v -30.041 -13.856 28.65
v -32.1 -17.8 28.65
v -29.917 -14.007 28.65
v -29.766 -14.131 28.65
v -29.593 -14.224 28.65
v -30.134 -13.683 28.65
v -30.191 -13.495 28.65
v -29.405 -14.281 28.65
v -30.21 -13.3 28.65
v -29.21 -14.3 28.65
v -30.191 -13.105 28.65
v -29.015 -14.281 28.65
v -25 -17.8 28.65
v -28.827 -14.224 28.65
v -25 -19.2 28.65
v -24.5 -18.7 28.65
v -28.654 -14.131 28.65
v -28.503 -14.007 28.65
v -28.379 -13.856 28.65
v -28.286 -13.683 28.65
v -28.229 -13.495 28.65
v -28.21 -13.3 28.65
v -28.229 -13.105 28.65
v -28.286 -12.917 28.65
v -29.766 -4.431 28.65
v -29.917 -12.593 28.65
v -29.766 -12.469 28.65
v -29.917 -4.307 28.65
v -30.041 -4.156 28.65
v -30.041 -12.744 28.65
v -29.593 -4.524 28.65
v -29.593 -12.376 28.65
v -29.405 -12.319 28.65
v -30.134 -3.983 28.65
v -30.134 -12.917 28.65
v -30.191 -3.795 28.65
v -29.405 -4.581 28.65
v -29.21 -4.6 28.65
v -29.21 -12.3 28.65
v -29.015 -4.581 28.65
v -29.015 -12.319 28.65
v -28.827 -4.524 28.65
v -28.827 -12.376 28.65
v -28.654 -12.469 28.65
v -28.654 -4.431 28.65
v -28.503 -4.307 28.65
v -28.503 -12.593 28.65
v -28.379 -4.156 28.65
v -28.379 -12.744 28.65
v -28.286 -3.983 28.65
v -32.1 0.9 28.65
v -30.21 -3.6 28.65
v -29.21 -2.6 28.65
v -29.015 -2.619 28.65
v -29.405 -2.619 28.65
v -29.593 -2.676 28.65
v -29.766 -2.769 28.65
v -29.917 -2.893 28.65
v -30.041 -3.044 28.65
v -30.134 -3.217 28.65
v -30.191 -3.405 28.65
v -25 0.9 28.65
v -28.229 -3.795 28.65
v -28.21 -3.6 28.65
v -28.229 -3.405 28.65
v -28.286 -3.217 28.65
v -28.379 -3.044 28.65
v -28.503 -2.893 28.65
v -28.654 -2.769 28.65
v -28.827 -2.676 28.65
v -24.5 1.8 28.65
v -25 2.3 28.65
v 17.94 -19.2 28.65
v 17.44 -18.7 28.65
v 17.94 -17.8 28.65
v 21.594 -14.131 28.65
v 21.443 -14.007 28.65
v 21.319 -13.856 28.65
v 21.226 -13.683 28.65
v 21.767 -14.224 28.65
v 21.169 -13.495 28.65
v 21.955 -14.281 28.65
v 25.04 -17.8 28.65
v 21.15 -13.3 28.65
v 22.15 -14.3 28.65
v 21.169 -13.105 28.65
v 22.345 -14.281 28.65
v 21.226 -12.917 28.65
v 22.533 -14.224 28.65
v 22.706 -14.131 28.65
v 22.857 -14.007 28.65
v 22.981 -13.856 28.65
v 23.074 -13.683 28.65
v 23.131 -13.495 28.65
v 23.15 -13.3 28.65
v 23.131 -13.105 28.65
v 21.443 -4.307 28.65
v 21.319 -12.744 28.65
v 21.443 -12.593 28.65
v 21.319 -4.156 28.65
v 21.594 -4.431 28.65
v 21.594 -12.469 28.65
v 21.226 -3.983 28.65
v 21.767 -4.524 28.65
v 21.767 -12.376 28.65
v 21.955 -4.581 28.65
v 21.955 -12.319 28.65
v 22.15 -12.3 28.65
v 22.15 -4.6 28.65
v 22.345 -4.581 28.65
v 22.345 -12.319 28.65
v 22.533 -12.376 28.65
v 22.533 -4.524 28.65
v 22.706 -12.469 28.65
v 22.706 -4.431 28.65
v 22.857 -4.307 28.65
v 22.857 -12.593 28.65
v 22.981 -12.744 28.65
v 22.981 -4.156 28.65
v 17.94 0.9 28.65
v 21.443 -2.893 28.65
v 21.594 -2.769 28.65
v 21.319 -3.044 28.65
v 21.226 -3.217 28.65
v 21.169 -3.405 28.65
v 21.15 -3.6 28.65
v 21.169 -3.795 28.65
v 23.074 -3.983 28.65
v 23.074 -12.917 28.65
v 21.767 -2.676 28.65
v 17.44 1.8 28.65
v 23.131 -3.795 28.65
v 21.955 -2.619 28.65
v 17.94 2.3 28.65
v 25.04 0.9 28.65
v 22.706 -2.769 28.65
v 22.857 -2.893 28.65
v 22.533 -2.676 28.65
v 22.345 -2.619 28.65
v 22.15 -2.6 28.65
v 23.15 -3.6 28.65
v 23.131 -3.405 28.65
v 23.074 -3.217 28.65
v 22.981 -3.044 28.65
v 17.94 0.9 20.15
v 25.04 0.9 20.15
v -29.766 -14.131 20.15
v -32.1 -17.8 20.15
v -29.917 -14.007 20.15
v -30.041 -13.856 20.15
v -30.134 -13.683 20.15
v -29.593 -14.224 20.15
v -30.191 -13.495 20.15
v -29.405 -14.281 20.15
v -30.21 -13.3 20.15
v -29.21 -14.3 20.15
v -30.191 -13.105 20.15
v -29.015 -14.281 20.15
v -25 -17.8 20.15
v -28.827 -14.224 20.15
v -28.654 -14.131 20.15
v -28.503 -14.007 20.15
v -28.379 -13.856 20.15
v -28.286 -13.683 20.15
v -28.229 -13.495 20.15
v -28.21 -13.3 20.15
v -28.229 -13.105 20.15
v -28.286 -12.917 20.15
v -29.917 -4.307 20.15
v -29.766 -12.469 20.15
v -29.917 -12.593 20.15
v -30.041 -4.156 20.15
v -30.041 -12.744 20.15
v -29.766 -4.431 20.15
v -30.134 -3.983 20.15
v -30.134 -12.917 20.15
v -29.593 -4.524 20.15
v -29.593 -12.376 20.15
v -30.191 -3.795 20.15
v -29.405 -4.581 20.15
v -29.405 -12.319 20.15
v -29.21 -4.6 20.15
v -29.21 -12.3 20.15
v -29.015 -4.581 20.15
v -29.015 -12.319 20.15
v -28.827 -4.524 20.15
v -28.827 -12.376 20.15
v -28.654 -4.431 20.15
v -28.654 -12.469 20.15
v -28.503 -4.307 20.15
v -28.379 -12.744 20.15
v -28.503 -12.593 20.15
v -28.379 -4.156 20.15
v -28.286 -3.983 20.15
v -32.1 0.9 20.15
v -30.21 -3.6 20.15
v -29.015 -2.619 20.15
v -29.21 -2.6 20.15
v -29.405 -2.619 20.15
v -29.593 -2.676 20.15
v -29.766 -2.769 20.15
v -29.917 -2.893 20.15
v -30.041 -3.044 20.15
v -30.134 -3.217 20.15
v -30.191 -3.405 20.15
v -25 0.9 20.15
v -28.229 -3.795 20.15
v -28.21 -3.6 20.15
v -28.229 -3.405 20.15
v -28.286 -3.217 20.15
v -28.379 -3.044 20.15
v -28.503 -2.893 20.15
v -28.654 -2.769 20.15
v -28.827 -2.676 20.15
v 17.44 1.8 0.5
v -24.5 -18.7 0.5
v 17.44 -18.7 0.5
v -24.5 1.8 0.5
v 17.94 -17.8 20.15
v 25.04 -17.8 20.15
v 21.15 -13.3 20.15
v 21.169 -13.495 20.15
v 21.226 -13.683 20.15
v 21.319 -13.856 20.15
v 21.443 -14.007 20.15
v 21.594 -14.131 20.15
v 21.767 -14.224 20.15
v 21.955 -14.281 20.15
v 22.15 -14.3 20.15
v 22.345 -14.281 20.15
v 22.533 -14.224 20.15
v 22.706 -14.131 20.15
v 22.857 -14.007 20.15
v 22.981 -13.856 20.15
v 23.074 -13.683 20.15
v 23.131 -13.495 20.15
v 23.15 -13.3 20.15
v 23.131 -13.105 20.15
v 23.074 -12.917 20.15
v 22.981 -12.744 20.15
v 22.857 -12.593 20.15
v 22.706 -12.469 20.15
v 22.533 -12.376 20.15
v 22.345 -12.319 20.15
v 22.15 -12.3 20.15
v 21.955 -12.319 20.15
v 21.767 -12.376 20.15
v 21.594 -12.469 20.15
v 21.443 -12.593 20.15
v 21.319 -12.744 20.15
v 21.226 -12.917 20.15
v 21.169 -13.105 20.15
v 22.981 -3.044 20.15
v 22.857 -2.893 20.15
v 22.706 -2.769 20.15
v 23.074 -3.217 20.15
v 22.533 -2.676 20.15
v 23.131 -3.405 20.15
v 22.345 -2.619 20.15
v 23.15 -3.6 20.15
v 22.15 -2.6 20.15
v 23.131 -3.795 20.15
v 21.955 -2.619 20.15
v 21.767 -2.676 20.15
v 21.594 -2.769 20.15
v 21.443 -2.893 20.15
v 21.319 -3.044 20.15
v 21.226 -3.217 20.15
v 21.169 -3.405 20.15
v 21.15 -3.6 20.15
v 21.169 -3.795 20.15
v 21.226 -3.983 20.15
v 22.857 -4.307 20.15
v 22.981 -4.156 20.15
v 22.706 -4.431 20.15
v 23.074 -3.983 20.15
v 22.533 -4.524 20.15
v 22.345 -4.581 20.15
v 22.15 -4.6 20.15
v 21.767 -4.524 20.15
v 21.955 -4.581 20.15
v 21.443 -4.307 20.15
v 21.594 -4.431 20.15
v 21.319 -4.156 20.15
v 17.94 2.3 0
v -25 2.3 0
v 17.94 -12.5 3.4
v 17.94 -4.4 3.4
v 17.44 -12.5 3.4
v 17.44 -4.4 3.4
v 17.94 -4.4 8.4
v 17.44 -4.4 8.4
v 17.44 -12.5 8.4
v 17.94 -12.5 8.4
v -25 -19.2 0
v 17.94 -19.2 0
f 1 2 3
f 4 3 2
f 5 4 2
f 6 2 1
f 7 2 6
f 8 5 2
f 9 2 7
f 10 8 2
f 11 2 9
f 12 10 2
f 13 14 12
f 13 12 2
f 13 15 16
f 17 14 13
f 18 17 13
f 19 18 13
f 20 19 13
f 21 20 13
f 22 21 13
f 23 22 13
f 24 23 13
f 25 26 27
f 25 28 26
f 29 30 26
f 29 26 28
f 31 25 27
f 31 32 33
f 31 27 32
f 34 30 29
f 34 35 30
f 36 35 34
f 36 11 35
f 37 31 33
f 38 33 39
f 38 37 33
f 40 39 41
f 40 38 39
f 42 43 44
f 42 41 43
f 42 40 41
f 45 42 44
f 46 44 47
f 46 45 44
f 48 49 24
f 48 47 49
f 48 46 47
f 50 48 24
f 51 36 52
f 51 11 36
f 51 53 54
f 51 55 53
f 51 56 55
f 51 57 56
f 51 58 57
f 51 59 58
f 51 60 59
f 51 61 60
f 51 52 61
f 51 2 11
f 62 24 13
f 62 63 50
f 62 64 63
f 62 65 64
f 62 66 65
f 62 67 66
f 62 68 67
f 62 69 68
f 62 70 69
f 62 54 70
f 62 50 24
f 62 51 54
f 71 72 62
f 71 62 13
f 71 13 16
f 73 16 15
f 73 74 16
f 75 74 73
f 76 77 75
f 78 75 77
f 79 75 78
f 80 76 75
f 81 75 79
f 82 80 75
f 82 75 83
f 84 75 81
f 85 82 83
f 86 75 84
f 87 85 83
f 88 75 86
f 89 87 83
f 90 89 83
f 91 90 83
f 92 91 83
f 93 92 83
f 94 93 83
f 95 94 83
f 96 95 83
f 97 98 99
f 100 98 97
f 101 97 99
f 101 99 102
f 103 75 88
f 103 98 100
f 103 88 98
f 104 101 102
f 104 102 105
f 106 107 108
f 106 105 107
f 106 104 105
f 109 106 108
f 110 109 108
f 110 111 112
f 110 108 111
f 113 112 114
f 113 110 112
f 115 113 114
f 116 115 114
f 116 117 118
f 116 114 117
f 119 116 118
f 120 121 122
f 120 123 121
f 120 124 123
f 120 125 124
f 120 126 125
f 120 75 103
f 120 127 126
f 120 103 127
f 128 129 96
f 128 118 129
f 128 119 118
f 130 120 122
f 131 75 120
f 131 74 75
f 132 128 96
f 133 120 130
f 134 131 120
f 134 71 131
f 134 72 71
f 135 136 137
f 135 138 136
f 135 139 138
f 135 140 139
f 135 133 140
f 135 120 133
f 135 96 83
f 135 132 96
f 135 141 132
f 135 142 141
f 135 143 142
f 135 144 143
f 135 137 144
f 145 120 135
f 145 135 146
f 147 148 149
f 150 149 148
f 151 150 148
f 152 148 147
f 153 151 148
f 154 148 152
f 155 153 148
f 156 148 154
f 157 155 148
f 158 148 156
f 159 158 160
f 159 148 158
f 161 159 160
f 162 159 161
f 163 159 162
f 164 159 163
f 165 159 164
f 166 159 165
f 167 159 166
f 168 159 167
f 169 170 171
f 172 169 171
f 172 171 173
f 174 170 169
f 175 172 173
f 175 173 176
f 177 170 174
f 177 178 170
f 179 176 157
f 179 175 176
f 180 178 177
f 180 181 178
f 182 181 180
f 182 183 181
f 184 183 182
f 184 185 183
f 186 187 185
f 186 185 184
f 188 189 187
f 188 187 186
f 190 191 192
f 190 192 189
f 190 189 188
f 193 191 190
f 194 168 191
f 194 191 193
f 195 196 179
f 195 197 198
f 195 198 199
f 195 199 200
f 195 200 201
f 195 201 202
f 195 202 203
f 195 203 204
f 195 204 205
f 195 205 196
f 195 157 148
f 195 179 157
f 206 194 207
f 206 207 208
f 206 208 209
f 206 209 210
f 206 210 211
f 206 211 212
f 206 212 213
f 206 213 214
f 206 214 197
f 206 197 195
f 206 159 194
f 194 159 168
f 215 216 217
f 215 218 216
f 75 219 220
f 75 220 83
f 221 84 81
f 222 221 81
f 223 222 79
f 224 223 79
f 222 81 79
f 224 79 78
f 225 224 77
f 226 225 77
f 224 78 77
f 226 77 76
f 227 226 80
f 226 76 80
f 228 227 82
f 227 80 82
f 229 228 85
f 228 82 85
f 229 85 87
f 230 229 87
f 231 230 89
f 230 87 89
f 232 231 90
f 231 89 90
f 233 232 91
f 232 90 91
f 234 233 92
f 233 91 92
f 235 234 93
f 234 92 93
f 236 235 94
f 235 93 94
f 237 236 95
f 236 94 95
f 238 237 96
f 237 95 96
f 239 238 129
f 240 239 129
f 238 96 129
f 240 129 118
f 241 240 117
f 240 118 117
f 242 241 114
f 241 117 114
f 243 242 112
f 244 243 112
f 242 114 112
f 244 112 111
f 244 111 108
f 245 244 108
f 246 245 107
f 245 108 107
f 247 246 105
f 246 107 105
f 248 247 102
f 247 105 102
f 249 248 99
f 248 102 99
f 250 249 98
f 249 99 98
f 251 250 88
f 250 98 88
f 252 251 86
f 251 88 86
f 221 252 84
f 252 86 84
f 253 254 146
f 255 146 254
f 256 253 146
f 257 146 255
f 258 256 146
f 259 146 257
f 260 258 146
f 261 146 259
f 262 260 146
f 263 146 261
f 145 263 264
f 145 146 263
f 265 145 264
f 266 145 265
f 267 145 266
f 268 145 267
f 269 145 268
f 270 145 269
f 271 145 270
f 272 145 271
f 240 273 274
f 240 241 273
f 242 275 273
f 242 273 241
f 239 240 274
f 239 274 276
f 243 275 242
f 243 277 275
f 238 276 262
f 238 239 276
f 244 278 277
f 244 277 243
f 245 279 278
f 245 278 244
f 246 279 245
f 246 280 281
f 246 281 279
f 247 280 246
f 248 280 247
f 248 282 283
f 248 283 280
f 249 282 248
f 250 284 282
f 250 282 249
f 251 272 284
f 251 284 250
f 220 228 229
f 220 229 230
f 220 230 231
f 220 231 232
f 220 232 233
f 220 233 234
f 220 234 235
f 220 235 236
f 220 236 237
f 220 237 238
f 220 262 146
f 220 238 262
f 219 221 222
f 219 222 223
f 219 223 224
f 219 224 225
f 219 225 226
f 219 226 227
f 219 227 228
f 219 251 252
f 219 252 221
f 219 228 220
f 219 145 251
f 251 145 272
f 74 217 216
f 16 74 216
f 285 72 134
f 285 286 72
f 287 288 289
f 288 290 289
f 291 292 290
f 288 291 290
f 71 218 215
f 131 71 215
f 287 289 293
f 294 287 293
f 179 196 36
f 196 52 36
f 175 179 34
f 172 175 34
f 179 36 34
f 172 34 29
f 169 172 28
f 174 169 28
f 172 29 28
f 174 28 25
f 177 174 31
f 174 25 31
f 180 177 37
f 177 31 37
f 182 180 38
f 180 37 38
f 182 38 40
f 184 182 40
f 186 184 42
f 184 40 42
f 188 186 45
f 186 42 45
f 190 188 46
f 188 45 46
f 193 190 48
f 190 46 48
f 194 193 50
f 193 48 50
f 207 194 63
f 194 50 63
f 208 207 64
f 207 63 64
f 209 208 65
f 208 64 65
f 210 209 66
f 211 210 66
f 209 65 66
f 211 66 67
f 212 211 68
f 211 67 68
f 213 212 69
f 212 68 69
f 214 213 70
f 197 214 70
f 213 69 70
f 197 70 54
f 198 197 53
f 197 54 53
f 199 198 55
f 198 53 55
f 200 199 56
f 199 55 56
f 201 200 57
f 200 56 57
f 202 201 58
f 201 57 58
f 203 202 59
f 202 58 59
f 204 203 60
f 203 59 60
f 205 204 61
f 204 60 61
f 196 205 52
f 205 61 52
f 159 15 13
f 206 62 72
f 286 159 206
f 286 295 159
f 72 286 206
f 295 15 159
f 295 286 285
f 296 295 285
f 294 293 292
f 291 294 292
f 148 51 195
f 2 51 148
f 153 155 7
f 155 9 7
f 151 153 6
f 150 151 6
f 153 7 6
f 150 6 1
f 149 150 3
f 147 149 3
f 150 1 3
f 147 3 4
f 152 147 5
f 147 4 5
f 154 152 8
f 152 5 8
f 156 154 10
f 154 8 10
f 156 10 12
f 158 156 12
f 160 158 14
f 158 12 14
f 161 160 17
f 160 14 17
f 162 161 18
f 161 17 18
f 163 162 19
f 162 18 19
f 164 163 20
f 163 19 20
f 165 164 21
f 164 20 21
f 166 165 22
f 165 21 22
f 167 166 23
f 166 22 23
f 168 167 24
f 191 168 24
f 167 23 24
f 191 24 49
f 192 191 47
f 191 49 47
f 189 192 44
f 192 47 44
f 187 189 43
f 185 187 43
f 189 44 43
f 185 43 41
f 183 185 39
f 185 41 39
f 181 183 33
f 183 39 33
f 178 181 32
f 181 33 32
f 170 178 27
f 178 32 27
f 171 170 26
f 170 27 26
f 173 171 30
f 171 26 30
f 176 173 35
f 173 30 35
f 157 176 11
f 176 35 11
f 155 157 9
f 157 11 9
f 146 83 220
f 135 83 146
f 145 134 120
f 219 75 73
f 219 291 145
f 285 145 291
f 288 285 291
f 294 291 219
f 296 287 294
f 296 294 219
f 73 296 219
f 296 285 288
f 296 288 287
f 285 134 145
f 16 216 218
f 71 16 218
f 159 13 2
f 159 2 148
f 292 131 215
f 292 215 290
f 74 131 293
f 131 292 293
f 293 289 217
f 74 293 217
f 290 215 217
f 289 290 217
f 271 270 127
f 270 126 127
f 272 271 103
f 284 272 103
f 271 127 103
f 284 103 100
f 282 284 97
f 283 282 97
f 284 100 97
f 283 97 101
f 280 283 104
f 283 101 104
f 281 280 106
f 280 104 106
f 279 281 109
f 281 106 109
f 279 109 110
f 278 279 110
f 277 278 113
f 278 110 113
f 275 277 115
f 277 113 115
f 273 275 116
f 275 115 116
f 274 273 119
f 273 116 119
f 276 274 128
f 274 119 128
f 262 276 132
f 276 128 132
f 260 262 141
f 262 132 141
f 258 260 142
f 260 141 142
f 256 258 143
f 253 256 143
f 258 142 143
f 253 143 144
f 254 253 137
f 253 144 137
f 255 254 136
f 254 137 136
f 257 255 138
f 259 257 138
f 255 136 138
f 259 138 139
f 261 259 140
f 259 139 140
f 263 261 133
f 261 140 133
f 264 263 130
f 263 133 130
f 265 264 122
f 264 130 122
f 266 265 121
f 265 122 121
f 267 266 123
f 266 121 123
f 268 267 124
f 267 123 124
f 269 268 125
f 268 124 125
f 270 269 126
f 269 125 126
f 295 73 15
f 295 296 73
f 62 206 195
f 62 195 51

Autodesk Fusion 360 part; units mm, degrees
sketch "Sketch1" plane through (0, 0, 0) normal (0, 0, 1) x (1, 0, 0)
  line L0 (-25, -19.2) -> (-25, 2.3)
  line L1 (-25, 2.3) -> (17.94, 2.3)
  line L2 (17.94, 2.3) -> (17.94, -19.2)
  line L3 (17.94, -19.2) -> (-25, -19.2)
  dimension "d1" = 21.5
  dimension "d2" = 42.94
extrude "Extrude1" add sketch "Sketch1" along normal blind 28.65
shell "Shell1" thickness 0.5 removed faces 1 at (3.6267, -12.0333, 28.65)
sketch "Sketch2" plane through (17.94, 0, 0) normal (1, 0, 0) x (0, 1, 0)
  line L0 (-19.2, 0) -> (2.3, 0)
  line L1 (2.3, 0) -> (2.3, 28.65)
  line L2 (2.3, 28.65) -> (-19.2, 28.65)
  line L3 (-19.2, 28.65) -> (-19.2, 0)
  line L4 (-12.5, 8.4) -> (-4.4, 8.4)
  line L5 (-4.4, 8.4) -> (-4.4, 3.4)
  line L6 (-4.4, 3.4) -> (-12.5, 3.4)
  line L7 (-12.5, 3.4) -> (-12.5, 8.4)
  dimension "d6" = 3.4
  dimension "d7" = 8.1
  dimension "d8" = 6.7
  dimension "d9" = 6.7
  dimension "d39" = 5
extrude "Extrude2" cut sketch "Sketch2" along normal mid plane 6 contours L4 L5 L6 L7
sketch "Sketch3" plane through (17.94, 0, 0) normal (1, 0, 0) x (0, 1, 0)
  line L0 (-4.4, 8.4) -> (-4.4, 3.4)
  line L1 (-4.4, 3.4) -> (-12.5, 3.4)
  line L2 (-12.5, 3.4) -> (-12.5, 8.4)
  line L3 (-12.5, 8.4) -> (-4.4, 8.4)
  line L4 (-19.2, 0) -> (2.3, 0)
  line L5 (2.3, 0) -> (2.3, 28.65)
  line L6 (2.3, 28.65) -> (-19.2, 28.65)
  line L7 (-19.2, 28.65) -> (-19.2, 0)
  line L8 (-17.8, 28.65) -> (0.9, 28.65)
  line L9 (0.9, 28.65) -> (0.9, 20.15)
  line L10 (0.9, 20.15) -> (-17.8, 20.15)
  line L11 (-17.8, 20.15) -> (-17.8, 28.65)
  dimension "d19" = 18.7
  dimension "d20" = 1.4
  dimension "d23" = 8.5
extrude "Extrude3" add sketch "Sketch3" along normal blind 7.1 contours L6 L8 L9 L10 L11
sketch "Sketch4" plane through (0, 0, 28.65) normal (0, 0, 1) x (-1, 0, 0)
  line L0 (-17.44, 18.7) -> (24.5, 18.7)
  line L1 (24.5, 18.7) -> (24.5, -1.8)
  line L2 (24.5, -1.8) -> (-17.44, -1.8)
  line L3 (-17.44, -1.8) -> (-17.44, 18.7)
  line L4 (-17.94, 19.2) -> (-17.94, 17.8)
  line L5 (-17.94, 17.8) -> (-25.04, 17.8)
  line L6 (-25.04, 17.8) -> (-25.04, -0.9)
  line L7 (-25.04, -0.9) -> (-17.94, -0.9)
  line L8 (-17.94, -0.9) -> (-17.94, -2.3)
  line L9 (-17.94, -2.3) -> (25, -2.3)
  line L10 (25, -2.3) -> (25, 19.2)
  line L11 (25, 19.2) -> (-17.94, 19.2)
  circle A0 centre (-22.15, 3.6) radius 2.25
  circle A1 centre (-22.15, 13.3) radius 2.25
  dimension "d40" = 4.5
  dimension "d41" = 4.5
  dimension "d44" = 9.7
  dimension "d45" = 4.71
  dimension "d46" = 4.71
  dimension "d47" = 4.5
sketch "Sketch6" plane through (-25, 0, 0) normal (-1, 0, 0) x (0, -1, 0)
  line L0 (-2.3, 0) -> (19.2, 0)
  line L1 (19.2, 0) -> (19.2, 28.65)
  line L2 (19.2, 28.65) -> (-2.3, 28.65)
  line L3 (-2.3, 28.65) -> (-2.3, 0)
  line L4 (-0.9, 28.65) -> (17.8, 28.65)
  line L5 (17.8, 28.65) -> (17.8, 20.15)
  line L6 (17.8, 20.15) -> (-0.9, 20.15)
  line L7 (-0.9, 20.15) -> (-0.9, 28.65)
  dimension "d27" = 1.4
  dimension "d28" = 18.7
  dimension "d29" = 8.5
extrude "Extrude5" add sketch "Sketch6" along normal blind 7.1 contours L2 L4 L5 L6 L7
sketch "Sketch7" plane through (0, 0, 28.65) normal (0, 0, 1) x (-1, 0, 0)
  line L0 (-17.44, 18.7) -> (24.5, 18.7)
  line L1 (24.5, 18.7) -> (24.5, -1.8)
  line L2 (24.5, -1.8) -> (-17.44, -1.8)
  line L3 (-17.44, -1.8) -> (-17.44, 18.7)
  line L4 (-17.94, 19.2) -> (-17.94, 17.8)
  line L5 (-17.94, 17.8) -> (-25.04, 17.8)
  line L6 (-25.04, 17.8) -> (-25.04, -0.9)
  line L7 (-25.04, -0.9) -> (-17.94, -0.9)
  line L8 (-17.94, -0.9) -> (-17.94, -2.3)
  line L9 (-17.94, -2.3) -> (25, -2.3)
  line L10 (25, -2.3) -> (25, -0.9)
  line L11 (25, -0.9) -> (32.1, -0.9)
  line L12 (32.1, -0.9) -> (32.1, 17.8)
  line L13 (32.1, 17.8) -> (25, 17.8)
  line L14 (25, 17.8) -> (25, 19.2)
  line L15 (25, 19.2) -> (-17.94, 19.2)
  circle A0 centre (26.6, 4.1) radius 1.025
  dimension "d34" = 2.05
  dimension "d35" = 2.1
  dimension "d36" = 5
sketch "Sketch8" plane through (0, 0, 28.65) normal (0, 0, 1) x (-1, 0, 0)
  line L0 (-17.44, 18.7) -> (24.5, 18.7)
  line L1 (24.5, 18.7) -> (24.5, -1.8)
  line L2 (24.5, -1.8) -> (-17.44, -1.8)
  line L3 (-17.44, -1.8) -> (-17.44, 18.7)
  line L4 (-17.94, 19.2) -> (-17.94, 17.8)
  line L5 (-17.94, 17.8) -> (-25.04, 17.8)
  line L6 (-25.04, 17.8) -> (-25.04, -0.9)
  line L7 (-25.04, -0.9) -> (-17.94, -0.9)
  line L8 (-17.94, -0.9) -> (-17.94, -2.3)
  line L9 (-17.94, -2.3) -> (25, -2.3)
  line L10 (25, -2.3) -> (25, -0.9)
  line L11 (25, -0.9) -> (32.1, -0.9)
  line L12 (32.1, -0.9) -> (32.1, 17.8)
  line L13 (32.1, 17.8) -> (25, 17.8)
  line L14 (25, 17.8) -> (25, 19.2)
  line L15 (25, 19.2) -> (-17.94, 19.2)
  circle A0 centre (-22.15, 3.6) radius 1
  circle A1 centre (-22.15, 13.3) radius 1
  circle A2 centre (29.21, 3.6) radius 1
  circle A3 centre (29.21, 13.3) radius 1
  dimension "d48" = 2
  dimension "d49" = 2
  dimension "d50" = 4.71
  dimension "d51" = 9.7
  dimension "d52" = 4.5
  dimension "d53" = 4.71
  dimension "d54" = 2
  dimension "d55" = 2
  dimension "d56" = 9.7
  dimension "d57" = 4.71
  dimension "d58" = 4.5
  dimension "d59" = 4.71
extrude "Extrude7" cut sketch "Sketch8" against normal blind 8.65 contours A0 | A1 | A2 | A3
